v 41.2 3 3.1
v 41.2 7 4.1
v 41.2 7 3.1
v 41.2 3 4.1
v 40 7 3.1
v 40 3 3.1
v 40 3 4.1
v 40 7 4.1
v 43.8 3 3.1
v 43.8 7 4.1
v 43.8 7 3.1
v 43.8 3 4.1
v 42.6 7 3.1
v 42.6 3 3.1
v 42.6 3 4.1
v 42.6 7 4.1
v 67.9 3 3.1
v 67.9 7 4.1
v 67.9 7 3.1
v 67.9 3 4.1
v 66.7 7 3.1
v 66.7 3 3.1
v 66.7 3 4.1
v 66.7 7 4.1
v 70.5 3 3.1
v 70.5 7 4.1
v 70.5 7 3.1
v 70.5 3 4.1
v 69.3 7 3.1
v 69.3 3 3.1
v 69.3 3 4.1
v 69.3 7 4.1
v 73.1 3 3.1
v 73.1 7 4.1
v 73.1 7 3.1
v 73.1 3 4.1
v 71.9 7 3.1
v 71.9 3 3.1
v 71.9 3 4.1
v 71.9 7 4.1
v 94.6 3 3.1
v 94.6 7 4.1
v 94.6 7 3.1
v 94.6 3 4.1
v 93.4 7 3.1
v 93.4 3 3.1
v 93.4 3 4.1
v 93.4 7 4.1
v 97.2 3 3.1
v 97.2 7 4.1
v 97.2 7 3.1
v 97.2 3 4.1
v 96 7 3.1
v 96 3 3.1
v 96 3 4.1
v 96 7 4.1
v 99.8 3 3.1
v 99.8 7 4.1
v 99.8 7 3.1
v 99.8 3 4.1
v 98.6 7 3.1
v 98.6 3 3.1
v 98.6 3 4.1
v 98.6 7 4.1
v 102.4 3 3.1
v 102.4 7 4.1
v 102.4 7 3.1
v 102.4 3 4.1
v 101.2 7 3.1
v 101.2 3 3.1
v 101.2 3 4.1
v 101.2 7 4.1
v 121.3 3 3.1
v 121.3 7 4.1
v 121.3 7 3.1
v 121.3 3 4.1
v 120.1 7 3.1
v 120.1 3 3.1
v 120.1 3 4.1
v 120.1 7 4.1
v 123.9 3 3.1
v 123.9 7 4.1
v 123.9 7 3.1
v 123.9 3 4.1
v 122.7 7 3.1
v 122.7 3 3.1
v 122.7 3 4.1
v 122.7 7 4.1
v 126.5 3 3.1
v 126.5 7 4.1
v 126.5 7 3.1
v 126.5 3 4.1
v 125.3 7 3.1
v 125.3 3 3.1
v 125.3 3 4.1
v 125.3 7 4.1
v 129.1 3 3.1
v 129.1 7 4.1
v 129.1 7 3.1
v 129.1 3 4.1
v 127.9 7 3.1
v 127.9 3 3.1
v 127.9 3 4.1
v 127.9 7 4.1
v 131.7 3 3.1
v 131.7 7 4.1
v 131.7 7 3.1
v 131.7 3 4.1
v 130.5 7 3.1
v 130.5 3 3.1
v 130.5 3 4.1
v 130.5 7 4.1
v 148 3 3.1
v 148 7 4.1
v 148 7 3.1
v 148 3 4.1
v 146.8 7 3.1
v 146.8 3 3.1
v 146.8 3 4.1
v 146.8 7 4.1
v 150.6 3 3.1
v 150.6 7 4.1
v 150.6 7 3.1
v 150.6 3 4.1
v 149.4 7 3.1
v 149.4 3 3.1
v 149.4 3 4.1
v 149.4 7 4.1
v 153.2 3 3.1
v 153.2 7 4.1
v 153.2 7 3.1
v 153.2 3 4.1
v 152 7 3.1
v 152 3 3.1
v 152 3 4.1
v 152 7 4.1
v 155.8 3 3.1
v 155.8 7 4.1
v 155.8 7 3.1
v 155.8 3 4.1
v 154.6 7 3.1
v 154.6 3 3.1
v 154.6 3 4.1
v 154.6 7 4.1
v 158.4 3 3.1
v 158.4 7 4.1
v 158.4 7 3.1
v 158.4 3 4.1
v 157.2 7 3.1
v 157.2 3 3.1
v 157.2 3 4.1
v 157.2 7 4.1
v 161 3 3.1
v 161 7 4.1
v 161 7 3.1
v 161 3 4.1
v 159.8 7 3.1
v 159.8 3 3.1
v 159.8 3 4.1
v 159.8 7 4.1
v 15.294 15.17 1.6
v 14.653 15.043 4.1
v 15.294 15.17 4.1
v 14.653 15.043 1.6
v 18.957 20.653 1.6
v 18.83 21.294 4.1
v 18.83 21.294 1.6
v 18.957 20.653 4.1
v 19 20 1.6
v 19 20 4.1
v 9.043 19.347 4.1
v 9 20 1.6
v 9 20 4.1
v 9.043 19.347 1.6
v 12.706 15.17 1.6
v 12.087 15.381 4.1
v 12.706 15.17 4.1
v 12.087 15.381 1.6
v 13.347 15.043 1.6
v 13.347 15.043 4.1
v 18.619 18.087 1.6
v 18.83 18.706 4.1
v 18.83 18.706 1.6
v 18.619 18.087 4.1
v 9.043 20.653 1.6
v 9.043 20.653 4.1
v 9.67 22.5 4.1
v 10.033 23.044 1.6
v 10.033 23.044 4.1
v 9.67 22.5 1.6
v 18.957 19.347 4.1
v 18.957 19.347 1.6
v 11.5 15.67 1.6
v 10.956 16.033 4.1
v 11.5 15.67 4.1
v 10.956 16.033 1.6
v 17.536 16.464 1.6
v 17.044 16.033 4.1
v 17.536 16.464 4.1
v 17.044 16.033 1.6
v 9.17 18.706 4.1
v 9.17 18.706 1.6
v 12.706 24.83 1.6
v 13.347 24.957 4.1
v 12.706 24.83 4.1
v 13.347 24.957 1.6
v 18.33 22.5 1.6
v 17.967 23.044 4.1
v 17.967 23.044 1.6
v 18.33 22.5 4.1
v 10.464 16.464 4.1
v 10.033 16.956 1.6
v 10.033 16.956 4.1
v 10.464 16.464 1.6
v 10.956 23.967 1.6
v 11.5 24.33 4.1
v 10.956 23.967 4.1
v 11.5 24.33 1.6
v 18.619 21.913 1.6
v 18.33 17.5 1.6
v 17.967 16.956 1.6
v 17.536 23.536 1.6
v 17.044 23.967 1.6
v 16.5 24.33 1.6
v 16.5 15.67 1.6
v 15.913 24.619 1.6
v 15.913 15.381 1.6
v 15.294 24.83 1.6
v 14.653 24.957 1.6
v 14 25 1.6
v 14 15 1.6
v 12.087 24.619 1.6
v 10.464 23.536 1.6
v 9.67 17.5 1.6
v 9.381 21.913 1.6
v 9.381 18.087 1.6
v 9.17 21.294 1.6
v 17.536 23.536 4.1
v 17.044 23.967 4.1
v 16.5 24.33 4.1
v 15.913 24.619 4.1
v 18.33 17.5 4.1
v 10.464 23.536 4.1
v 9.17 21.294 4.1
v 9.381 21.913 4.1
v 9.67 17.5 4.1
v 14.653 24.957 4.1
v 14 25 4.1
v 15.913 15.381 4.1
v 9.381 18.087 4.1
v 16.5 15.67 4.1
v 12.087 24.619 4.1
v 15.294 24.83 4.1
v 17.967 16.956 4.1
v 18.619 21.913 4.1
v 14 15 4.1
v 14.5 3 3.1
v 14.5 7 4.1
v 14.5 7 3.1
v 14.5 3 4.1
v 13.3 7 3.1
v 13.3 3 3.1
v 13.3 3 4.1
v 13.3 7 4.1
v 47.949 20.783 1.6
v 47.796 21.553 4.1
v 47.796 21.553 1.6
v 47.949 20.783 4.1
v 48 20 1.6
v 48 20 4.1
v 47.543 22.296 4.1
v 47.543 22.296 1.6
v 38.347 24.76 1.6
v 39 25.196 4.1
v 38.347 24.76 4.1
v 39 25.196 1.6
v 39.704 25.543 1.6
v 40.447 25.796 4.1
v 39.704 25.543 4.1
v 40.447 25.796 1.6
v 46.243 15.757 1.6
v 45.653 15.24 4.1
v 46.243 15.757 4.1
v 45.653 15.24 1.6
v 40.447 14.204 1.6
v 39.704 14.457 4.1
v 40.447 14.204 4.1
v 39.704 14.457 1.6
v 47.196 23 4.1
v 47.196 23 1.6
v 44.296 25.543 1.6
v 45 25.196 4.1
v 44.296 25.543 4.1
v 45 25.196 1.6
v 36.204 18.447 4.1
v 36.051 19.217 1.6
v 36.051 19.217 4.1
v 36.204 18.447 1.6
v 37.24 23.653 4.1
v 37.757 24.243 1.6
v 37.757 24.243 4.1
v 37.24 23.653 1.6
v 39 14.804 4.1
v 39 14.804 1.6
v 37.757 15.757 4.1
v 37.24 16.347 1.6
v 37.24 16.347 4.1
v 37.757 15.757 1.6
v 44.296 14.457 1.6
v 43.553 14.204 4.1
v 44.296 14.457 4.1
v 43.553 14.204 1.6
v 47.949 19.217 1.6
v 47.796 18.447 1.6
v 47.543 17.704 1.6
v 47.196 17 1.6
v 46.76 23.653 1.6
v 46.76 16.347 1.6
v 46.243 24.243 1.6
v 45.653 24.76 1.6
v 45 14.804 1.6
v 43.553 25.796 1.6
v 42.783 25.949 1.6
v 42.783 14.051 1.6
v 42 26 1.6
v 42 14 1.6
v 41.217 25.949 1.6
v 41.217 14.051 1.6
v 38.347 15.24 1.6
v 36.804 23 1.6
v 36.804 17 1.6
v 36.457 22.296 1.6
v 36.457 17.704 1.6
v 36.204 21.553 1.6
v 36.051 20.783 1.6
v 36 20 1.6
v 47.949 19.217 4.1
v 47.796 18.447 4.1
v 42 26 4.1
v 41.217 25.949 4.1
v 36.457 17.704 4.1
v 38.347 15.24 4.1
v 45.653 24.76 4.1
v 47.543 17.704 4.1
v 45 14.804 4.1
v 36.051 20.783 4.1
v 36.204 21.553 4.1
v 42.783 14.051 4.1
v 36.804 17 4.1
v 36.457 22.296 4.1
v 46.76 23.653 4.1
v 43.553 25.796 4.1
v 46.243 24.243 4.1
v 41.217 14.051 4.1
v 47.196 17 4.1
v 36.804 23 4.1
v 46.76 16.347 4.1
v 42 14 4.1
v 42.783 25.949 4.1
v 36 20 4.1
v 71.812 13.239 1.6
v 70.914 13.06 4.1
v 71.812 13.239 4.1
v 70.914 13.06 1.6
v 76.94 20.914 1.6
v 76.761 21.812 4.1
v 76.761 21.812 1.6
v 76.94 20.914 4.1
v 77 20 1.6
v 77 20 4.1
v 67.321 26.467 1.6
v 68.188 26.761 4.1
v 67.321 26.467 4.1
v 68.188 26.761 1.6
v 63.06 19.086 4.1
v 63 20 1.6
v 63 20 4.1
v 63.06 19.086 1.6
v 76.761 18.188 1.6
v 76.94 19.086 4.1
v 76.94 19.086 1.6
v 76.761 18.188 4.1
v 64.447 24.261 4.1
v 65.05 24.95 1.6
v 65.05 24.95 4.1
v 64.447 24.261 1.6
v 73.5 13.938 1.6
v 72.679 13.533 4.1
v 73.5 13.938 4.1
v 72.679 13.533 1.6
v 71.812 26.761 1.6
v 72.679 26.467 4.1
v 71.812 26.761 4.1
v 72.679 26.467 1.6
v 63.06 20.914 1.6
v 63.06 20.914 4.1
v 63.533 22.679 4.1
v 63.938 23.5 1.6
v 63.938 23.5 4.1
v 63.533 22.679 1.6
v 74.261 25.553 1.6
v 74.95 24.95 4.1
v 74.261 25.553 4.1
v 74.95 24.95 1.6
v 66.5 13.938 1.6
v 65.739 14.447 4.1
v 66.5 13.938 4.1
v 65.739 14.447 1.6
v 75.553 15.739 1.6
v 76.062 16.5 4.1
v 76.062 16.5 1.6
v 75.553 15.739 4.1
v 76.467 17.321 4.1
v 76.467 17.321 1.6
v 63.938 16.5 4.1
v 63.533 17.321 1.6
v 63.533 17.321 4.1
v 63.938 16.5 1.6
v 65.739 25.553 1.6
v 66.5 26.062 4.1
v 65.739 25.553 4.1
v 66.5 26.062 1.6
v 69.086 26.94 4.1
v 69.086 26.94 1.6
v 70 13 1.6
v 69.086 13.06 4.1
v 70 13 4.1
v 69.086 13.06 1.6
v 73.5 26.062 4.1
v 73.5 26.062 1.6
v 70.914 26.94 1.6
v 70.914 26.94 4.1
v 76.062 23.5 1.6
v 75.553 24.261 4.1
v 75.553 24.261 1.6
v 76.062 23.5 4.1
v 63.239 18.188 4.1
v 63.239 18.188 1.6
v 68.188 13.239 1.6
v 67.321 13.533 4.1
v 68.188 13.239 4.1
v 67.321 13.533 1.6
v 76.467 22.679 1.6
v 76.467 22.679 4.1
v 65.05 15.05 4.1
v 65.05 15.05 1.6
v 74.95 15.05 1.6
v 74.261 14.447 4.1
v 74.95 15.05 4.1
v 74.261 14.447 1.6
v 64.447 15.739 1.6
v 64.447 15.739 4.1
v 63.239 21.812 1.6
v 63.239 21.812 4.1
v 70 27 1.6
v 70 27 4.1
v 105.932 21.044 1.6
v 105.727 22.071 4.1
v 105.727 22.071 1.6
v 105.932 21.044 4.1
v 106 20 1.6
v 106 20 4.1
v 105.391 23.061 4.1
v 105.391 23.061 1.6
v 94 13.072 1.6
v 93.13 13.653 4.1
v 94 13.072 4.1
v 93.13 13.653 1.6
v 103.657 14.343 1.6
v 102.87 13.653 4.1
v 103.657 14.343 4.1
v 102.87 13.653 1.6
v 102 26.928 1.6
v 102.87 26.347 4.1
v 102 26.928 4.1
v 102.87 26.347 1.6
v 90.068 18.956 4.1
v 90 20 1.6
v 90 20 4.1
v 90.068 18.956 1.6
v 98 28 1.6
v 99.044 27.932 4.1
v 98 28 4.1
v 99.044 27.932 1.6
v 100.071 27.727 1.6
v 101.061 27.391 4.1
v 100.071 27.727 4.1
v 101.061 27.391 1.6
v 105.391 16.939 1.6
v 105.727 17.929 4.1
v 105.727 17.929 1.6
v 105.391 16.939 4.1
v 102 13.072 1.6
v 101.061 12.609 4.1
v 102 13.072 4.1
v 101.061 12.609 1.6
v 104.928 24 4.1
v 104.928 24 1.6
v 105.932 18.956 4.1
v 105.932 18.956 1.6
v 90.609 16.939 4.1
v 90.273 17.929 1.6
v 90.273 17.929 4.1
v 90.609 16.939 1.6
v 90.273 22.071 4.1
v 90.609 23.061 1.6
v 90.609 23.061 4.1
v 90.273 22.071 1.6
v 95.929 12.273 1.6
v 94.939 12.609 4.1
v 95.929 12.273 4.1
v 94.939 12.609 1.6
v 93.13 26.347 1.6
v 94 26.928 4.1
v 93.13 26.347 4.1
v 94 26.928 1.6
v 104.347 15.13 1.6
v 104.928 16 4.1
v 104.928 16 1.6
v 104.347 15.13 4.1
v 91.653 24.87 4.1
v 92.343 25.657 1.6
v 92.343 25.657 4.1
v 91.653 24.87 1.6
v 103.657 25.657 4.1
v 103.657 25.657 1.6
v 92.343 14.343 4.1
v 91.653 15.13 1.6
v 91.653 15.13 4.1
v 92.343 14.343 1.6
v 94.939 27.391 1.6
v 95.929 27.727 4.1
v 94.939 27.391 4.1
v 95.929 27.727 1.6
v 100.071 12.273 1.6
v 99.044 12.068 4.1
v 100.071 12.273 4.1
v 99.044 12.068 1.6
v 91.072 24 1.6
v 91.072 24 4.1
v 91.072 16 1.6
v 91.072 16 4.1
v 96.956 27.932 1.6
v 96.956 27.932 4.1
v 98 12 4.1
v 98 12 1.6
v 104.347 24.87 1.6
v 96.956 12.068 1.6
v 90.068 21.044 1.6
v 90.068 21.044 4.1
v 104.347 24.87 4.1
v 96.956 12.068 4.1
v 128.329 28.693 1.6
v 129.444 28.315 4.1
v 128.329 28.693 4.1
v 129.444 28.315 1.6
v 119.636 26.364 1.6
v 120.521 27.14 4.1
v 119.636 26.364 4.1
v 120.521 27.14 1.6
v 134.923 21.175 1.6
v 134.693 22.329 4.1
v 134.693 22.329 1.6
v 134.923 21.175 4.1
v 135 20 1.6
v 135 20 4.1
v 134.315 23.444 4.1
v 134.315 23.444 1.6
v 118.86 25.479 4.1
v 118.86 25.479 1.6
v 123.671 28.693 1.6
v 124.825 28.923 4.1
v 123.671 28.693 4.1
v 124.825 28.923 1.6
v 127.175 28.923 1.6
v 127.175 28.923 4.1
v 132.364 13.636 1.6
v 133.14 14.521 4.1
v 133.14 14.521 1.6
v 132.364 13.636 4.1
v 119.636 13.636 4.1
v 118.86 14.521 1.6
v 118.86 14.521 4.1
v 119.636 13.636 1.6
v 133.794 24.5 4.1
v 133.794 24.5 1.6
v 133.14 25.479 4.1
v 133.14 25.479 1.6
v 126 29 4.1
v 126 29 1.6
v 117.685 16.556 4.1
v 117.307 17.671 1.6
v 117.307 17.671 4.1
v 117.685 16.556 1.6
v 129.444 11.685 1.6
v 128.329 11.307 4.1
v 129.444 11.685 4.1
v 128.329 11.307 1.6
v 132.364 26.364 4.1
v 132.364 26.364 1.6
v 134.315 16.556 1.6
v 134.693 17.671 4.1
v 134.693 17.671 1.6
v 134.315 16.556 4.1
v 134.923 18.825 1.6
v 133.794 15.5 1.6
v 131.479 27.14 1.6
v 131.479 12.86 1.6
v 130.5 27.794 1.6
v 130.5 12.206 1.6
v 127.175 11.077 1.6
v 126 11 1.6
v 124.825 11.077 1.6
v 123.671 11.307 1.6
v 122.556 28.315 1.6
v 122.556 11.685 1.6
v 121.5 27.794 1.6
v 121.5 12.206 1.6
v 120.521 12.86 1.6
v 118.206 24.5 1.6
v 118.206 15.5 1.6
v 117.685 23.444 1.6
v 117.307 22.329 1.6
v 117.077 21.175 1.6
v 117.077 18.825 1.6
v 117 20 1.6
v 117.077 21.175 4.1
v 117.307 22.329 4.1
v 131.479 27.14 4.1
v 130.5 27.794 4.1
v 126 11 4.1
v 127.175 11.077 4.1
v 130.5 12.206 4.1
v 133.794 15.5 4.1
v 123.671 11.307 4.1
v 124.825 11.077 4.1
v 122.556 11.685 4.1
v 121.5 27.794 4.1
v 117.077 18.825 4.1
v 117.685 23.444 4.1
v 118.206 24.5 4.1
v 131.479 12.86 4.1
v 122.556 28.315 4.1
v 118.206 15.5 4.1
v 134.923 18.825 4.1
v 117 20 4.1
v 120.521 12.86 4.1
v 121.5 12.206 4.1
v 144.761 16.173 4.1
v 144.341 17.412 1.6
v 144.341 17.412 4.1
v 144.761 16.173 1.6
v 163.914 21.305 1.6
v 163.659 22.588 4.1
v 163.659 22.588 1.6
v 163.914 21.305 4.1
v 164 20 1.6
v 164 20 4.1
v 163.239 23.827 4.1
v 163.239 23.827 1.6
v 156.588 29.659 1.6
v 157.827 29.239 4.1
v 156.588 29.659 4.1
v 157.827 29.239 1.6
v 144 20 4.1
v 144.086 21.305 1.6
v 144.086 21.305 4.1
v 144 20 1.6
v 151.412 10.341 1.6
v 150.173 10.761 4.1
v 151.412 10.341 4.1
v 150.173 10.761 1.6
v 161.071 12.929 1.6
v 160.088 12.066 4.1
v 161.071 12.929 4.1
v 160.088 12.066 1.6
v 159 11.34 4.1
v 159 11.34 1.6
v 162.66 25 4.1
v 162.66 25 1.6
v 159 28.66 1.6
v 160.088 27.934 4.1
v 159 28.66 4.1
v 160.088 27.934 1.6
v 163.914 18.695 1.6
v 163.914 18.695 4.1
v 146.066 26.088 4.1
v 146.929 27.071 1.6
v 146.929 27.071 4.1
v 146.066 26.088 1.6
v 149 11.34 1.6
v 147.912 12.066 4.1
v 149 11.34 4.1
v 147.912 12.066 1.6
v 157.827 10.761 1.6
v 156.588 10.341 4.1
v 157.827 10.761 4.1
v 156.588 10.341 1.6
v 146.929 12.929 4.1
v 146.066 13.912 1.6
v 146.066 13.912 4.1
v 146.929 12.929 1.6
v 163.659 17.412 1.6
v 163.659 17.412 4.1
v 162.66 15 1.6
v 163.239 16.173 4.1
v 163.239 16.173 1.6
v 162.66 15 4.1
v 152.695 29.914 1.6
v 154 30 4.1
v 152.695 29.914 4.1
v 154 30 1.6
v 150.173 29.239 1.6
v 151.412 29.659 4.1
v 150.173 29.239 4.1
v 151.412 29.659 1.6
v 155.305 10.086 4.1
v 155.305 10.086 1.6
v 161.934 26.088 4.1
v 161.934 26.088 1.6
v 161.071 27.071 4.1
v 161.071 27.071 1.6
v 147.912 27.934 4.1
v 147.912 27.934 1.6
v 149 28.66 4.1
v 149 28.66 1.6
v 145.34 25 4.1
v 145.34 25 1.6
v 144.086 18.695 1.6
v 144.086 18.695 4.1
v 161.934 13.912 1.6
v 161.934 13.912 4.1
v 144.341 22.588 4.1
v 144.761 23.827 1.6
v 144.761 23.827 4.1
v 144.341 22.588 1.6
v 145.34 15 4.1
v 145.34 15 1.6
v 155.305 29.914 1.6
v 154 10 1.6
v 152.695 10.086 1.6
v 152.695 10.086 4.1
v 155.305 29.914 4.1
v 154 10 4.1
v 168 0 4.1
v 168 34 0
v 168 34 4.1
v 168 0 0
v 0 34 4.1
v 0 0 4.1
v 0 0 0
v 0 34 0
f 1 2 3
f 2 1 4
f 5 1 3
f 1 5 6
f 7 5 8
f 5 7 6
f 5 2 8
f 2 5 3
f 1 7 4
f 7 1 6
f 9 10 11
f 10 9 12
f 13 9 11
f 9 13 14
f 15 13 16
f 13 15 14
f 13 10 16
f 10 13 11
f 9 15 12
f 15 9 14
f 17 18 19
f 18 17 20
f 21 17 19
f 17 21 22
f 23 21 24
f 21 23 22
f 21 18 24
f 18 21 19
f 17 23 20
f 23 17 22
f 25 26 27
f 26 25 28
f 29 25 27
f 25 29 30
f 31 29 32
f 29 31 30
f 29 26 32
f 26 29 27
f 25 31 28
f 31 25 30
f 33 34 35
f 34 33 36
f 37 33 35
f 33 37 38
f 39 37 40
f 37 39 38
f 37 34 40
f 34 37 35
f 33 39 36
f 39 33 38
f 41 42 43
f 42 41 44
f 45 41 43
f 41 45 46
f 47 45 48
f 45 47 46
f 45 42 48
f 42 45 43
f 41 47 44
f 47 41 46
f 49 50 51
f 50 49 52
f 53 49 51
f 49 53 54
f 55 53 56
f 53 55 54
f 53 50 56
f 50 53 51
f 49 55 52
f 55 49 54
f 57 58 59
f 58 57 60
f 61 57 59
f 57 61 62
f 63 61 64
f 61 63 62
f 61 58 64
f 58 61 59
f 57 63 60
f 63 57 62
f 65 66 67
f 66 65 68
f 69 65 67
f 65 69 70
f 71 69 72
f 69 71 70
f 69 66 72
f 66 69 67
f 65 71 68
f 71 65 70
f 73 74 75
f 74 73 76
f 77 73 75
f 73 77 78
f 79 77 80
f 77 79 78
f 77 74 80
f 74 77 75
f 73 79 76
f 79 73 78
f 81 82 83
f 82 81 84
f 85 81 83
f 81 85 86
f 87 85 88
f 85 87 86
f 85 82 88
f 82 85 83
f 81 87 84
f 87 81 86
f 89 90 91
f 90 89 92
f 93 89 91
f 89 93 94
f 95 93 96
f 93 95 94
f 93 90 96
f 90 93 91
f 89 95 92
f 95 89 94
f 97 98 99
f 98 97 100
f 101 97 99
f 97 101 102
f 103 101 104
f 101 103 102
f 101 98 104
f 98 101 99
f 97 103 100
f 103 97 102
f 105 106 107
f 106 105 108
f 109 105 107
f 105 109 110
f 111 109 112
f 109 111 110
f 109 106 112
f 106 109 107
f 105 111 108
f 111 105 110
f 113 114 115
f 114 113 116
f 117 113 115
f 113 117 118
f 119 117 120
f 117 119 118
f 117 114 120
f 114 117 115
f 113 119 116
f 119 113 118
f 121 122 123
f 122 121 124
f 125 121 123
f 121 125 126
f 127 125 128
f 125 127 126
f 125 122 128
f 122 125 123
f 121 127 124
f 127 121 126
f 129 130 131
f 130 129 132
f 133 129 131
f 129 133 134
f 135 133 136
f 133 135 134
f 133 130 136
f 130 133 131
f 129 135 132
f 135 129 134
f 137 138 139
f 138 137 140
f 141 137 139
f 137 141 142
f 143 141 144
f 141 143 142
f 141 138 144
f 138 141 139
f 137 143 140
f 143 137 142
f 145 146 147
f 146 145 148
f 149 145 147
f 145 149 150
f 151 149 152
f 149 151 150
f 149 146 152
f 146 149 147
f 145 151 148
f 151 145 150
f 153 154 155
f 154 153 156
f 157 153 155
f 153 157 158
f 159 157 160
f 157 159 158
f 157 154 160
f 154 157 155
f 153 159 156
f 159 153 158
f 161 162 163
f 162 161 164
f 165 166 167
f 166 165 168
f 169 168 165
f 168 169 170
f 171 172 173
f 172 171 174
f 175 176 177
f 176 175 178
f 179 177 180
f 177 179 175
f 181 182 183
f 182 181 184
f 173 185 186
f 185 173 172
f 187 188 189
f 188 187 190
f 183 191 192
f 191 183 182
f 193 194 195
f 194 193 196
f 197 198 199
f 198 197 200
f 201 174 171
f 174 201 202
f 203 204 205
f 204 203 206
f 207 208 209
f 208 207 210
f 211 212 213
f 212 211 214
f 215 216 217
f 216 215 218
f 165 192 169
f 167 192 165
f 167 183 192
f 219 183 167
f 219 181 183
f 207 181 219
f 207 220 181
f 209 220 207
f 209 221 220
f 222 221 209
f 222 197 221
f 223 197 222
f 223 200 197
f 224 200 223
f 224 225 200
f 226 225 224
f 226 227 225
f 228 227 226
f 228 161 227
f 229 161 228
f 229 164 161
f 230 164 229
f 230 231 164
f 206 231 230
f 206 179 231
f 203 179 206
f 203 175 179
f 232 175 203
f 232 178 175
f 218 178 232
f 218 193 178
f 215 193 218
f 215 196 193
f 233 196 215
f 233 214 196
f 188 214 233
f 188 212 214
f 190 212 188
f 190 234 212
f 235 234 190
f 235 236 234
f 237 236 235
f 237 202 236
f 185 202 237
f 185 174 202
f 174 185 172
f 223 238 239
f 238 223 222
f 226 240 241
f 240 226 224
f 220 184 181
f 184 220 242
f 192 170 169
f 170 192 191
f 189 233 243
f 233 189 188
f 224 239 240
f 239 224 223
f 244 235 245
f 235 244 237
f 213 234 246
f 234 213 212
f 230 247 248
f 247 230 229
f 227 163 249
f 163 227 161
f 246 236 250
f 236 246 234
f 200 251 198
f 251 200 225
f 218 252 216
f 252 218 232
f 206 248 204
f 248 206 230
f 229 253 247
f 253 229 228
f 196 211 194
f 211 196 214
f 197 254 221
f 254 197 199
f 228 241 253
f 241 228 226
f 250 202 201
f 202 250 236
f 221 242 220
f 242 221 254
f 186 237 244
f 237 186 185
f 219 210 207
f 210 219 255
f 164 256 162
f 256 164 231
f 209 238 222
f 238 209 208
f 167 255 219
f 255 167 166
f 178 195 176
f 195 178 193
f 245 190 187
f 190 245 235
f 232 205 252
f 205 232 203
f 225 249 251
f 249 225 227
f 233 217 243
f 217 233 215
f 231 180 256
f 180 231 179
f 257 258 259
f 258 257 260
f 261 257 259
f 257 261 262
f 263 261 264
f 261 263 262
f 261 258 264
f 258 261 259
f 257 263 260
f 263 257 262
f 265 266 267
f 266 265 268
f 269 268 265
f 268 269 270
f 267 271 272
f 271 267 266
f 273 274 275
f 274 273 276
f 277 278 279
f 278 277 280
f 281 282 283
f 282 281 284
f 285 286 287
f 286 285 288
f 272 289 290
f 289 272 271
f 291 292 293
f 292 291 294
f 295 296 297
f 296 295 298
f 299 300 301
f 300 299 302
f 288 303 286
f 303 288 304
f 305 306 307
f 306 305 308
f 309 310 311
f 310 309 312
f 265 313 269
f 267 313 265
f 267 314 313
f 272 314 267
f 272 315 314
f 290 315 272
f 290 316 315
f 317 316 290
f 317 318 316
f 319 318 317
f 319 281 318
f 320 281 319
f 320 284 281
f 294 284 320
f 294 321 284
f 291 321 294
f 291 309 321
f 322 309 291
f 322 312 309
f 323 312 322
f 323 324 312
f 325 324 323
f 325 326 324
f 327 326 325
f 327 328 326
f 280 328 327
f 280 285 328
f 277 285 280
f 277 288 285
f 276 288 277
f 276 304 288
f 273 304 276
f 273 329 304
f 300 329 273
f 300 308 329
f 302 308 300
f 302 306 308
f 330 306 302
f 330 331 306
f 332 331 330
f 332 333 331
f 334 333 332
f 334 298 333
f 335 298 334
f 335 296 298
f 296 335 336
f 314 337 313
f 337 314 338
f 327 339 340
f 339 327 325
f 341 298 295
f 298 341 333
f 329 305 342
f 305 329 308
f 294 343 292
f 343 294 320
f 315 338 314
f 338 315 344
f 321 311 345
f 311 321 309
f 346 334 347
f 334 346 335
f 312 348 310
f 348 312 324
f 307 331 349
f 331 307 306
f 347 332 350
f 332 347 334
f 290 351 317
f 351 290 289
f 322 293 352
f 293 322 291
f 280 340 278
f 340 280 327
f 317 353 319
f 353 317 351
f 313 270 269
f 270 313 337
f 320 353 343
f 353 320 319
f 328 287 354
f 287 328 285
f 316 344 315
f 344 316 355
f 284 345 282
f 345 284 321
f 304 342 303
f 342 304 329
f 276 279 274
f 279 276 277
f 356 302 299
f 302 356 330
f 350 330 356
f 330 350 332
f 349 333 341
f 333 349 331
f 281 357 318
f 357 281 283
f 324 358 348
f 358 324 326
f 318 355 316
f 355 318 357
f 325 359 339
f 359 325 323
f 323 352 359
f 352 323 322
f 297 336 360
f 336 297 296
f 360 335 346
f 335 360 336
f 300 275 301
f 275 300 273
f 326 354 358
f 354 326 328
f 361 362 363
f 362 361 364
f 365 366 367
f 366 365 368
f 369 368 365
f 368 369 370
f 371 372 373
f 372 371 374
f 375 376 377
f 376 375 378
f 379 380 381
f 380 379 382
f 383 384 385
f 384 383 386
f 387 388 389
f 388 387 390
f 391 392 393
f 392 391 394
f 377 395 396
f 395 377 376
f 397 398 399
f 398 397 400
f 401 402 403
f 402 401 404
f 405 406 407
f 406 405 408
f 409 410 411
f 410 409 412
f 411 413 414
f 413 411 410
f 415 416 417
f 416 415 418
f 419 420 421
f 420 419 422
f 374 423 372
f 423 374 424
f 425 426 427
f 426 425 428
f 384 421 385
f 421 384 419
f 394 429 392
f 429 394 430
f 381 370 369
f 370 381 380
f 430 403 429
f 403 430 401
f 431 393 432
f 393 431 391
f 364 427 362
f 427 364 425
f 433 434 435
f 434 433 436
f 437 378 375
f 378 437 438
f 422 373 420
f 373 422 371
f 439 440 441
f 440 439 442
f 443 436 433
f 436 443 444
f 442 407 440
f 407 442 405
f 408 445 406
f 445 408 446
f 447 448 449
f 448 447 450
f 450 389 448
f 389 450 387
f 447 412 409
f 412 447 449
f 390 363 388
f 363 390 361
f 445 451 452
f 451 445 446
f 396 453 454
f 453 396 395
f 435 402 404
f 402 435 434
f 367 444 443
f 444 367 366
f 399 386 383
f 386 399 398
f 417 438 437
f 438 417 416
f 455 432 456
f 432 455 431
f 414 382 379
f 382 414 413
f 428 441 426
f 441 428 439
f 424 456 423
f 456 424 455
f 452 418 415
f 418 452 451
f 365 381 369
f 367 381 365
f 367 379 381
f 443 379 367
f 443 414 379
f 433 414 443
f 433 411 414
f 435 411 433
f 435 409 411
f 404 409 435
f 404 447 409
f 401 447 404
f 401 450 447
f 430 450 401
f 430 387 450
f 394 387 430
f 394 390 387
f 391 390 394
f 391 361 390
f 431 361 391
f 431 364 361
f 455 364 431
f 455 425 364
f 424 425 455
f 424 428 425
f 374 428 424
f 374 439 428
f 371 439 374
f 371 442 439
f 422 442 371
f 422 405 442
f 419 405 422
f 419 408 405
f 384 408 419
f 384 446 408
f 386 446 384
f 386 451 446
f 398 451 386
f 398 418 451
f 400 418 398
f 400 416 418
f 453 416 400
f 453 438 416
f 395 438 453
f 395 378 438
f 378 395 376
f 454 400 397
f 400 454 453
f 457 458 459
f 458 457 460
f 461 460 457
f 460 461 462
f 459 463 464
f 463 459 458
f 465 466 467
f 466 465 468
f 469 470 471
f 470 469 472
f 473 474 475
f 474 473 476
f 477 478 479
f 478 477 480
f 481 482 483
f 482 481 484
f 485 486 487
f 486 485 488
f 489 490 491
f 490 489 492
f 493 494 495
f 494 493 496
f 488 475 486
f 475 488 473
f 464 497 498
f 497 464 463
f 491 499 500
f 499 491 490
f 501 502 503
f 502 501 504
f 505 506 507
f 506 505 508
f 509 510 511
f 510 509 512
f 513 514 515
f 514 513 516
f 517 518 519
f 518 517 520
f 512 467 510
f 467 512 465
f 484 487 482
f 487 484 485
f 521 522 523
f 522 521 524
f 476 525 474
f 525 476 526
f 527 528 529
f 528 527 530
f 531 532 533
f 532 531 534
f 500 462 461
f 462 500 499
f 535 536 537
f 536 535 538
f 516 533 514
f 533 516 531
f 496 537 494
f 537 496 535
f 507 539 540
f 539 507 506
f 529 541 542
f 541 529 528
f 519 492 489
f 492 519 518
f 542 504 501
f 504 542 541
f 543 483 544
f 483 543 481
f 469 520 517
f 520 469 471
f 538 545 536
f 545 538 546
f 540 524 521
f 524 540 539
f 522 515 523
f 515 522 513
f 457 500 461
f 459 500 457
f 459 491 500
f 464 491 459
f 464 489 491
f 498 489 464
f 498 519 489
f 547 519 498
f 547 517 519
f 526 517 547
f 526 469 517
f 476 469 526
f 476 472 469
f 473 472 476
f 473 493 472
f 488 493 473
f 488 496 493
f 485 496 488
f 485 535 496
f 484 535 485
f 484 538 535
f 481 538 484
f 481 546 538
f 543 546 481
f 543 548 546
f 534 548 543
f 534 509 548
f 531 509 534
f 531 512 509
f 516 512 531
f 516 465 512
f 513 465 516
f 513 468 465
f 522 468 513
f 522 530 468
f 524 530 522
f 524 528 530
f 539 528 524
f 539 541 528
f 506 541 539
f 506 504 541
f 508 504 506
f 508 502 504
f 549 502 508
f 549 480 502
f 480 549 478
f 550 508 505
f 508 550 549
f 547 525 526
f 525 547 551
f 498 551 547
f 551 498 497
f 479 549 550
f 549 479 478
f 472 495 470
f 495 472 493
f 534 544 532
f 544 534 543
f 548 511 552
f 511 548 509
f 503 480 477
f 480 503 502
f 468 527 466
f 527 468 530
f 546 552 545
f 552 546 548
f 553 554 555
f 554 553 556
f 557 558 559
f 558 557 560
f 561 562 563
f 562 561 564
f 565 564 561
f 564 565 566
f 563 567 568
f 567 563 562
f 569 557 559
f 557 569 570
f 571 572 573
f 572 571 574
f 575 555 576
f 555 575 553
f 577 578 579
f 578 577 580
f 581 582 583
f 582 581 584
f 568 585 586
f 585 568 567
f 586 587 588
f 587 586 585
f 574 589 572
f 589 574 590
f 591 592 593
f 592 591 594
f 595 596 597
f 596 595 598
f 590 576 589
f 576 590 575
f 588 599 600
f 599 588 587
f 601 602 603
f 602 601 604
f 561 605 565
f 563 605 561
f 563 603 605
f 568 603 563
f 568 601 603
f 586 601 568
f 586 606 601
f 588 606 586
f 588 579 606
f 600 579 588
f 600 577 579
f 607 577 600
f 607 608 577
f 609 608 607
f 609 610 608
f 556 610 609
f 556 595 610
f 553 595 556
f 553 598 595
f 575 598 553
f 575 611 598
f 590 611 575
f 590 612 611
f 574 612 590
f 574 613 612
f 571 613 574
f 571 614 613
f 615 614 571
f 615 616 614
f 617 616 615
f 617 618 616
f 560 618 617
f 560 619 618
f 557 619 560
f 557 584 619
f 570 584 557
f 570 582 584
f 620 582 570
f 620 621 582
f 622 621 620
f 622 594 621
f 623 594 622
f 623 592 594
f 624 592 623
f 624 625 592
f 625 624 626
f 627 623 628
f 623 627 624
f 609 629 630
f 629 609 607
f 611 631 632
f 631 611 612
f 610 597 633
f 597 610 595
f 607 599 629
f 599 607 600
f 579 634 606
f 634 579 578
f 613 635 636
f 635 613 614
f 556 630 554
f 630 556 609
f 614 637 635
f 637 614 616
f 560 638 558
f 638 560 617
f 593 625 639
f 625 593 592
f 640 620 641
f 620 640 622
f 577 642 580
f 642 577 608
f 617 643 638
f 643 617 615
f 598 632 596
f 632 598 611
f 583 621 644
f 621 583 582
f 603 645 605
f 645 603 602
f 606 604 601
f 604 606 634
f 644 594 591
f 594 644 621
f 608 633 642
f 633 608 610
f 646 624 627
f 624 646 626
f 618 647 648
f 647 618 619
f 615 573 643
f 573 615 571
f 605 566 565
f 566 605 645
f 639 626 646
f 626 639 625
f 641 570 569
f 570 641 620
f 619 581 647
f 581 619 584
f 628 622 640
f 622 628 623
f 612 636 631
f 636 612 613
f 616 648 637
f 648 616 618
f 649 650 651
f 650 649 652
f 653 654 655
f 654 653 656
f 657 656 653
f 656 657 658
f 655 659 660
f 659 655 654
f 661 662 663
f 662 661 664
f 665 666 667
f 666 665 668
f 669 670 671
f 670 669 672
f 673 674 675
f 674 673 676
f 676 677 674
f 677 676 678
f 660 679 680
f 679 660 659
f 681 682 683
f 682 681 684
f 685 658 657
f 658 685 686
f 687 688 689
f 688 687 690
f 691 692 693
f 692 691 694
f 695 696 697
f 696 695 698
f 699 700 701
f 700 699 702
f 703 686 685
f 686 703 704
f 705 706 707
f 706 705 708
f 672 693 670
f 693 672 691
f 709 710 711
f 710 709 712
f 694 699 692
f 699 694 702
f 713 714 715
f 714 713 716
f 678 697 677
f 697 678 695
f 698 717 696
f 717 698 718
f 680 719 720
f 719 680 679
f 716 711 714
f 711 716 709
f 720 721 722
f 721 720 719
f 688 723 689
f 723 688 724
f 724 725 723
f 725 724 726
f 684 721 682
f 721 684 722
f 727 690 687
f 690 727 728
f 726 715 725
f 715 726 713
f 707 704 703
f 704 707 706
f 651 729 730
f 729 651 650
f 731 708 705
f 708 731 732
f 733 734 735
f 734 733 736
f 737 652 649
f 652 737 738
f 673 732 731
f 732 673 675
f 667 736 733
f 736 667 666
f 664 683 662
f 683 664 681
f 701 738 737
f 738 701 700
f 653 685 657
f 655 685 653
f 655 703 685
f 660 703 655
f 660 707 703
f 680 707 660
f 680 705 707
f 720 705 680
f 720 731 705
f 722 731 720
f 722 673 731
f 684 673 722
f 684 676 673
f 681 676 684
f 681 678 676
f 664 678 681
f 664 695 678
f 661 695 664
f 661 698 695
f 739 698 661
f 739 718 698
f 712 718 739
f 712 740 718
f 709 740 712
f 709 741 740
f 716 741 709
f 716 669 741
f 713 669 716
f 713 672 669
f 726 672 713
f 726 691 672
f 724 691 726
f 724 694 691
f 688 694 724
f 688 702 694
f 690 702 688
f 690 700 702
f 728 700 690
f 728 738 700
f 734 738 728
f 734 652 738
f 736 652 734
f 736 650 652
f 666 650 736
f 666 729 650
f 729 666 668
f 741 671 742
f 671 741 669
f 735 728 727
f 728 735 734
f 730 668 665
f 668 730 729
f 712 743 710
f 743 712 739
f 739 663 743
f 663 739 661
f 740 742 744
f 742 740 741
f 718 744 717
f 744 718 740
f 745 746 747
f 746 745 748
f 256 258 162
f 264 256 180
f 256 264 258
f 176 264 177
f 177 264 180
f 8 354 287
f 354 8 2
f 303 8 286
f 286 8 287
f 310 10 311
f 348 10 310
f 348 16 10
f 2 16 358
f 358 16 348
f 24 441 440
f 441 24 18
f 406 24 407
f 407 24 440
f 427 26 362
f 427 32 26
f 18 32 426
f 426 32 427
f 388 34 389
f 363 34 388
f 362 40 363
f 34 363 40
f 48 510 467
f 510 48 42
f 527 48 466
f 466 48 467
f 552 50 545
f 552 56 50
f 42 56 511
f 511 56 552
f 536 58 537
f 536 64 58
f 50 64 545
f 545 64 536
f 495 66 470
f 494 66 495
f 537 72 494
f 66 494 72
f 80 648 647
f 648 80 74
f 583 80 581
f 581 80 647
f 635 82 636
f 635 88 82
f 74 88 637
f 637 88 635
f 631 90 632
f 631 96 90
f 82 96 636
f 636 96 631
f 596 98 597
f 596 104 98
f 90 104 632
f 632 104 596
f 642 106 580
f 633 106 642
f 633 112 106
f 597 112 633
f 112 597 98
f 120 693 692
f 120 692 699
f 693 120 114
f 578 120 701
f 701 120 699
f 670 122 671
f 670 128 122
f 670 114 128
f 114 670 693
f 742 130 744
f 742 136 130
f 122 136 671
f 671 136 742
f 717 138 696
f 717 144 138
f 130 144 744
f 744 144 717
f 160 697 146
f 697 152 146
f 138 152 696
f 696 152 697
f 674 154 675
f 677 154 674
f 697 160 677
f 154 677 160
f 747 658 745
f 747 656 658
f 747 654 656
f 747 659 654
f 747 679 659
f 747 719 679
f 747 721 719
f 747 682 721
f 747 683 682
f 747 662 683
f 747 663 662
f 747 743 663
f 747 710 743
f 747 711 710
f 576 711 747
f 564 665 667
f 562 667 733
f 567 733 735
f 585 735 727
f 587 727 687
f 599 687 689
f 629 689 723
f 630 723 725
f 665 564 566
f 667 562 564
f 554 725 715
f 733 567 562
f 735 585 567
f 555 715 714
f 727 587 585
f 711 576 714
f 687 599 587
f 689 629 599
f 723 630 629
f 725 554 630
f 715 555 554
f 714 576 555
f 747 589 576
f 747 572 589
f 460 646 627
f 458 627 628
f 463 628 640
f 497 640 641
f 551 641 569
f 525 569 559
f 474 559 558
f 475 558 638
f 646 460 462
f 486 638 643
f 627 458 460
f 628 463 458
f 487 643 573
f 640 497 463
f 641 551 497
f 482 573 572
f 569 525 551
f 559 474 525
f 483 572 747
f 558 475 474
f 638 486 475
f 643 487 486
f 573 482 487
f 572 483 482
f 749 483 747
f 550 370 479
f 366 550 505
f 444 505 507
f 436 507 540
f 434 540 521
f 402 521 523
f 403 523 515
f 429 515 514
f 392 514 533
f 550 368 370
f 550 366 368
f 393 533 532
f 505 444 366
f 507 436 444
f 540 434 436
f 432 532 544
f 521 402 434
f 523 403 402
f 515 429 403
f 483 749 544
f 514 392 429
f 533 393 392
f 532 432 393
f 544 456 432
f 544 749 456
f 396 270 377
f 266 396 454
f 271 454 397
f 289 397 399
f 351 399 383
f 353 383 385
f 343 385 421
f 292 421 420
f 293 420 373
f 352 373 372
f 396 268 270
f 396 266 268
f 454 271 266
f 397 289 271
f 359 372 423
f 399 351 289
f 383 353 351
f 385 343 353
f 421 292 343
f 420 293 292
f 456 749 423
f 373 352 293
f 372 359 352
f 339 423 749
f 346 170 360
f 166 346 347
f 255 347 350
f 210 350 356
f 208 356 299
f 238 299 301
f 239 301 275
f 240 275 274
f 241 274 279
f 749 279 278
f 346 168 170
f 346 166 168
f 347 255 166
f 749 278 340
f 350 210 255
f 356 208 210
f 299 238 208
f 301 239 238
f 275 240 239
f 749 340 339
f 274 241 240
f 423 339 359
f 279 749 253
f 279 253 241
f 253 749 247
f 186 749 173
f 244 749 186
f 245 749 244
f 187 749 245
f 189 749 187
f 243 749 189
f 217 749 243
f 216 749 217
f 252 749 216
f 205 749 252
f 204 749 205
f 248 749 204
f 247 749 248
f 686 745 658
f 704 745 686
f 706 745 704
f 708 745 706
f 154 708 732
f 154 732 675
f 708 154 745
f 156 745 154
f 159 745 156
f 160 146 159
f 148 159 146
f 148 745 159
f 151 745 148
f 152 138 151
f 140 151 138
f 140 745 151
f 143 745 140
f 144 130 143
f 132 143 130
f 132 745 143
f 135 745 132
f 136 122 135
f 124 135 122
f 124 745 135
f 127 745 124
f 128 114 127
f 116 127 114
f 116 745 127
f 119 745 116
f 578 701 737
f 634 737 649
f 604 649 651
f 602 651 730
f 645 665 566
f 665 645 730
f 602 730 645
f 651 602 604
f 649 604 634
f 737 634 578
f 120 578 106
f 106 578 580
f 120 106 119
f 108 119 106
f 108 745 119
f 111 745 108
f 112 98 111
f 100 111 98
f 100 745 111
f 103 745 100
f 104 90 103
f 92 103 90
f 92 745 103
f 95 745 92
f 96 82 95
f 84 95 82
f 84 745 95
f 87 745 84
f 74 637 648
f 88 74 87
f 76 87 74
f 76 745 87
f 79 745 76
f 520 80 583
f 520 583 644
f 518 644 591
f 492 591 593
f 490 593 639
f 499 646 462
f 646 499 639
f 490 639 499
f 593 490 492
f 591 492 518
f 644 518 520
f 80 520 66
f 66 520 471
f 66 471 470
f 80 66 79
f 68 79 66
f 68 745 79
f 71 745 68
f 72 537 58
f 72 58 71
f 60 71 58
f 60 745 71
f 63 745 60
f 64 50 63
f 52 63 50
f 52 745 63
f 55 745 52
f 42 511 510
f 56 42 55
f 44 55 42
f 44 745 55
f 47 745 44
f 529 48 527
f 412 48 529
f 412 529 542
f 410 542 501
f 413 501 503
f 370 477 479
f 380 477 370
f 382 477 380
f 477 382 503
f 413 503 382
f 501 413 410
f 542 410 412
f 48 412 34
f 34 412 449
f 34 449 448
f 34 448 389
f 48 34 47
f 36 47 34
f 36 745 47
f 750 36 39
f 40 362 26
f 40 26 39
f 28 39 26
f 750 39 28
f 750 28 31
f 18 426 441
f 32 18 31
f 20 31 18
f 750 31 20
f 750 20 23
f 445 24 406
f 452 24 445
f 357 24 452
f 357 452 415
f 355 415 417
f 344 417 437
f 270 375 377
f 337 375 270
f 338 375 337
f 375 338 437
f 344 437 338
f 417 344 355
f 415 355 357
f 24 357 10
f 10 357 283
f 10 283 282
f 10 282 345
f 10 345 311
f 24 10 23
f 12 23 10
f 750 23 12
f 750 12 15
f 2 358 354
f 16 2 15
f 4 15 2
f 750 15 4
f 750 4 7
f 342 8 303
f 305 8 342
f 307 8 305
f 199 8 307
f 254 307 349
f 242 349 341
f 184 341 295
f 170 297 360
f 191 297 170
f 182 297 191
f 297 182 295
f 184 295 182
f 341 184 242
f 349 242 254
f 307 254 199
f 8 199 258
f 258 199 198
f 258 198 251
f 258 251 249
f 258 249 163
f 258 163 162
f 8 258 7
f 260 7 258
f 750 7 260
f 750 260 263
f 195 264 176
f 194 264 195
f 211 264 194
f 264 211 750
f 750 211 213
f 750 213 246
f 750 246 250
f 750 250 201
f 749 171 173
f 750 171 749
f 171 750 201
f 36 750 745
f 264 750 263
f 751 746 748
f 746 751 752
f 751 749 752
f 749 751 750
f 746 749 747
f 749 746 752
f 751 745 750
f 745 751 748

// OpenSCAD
// file: riser_common.scad
// riser_common.scad — shared dimensions for the bench instrument risers.
//
// ONE part, printed as many times as you need, at two heights. A pedestal that
// stands on Gridfinity feet, so it LATCHES into a Clickfinity desk plate instead
// of skating. Put one under each instrument foot and the instrument's own
// footprint becomes open grid underneath.
//
//   hot air station  4 pedestals @ 6"
//   oscilloscope     2 pedestals @ 2"
//
// WHY THE TOP IS FLAT BY DEFAULT
//   A locating pocket has to be cut where that instrument's foot actually lands,
//   which makes the part bespoke — and the value here is that every pedestal is
//   interchangeable. The pedestal is latched to the plate and cannot move; the
//   instrument sits on it on its own rubber feet, which grip PETG fine. Set
//   POCKET_D above 0 only if something actually creeps in use, and accept that
//   those pedestals stop being interchangeable when you do.
//
// WHY IT IS MODELLED SOLID
//   No cavity, no walls, no open front — the slicer's infill decides how much
//   material this uses, which is the right place for that decision. A hollow
//   shell would need an opening to be useful, and an opening on a load-bearing
//   pedestal puts a weak axis under an instrument. Storage goes in the open grid
//   BETWEEN the pedestals, which is the point of raising anything.
//
// PRINT ORIENTATION: as emitted — feet DOWN, flat top up. Nothing to bridge, no
// supports, and the top face comes out flat as the last thing printed.

include <../lib/gridfinity.scad>

// Standardised across this repo after the OpenSCAD 2026.06.12 tessellation
// gotcha (scattered height/$fn combinations emit non-manifold edges). Do not
// raise this without re-rendering and checking the validator.
$fn = 48;

/* [Footprint] */
GX = 2;   // [1:1:4] cells across
GY = 2;   // [1:1:4] cells deep

/* [Heights] */
// Nominal, from the bench layout — both are "about", not measured constraints,
// so tune them freely. The pedestal height IS the clear height under the
// instrument, measured from the same datum a bin sits on (the desk plate's
// socket floor), so it compares directly against a bin's total height.
//
// Clickfinity's latch GRIPS: a bin comes out by pulling straight up against four
// arms per cell. Budget the bin height PLUS release travel PLUS room to get a
// hand in — sizing to bin height alone builds a shelf whose bins you cannot
// extract. Rule of thumb: usable bin height is roughly RISER_H minus 40.
SCOPE_RISE  =  50.8;  // 2" — fits shallow trays underneath (~10 mm bins)
HOTAIR_RISE = 152.4;  // 6" — takes the tallest bins in the repo with room over

// Either height can be overridden without editing this file:
//   openscad -o r.stl --export-format binstl -D RISER_H=90 riser_pedestal_scope.scad

/* [Foot pocket — OPTIONAL] */
POCKET_D = 0.00;   // finished pocket diameter. 0 = flat top (default).
                   //   If you do want pockets, get this from riser_foot_gauge —
                   //   NOT from calipers on the foot. The number that matters is
                   //   the finished hole a foot drops into, which folds the
                   //   foot's size, its rubber compliance, and this printer's
                   //   hole shrinkage into one reading.
POCKET_H = 2.50;   // [1:0.5:6] pocket depth. Shallow on purpose — it only has to
                   //   stop creep. Deep pockets on rubber feet make the
                   //   instrument awkward to lift off and add nothing.

/* [Stability] */
// Height-to-width ratio past which a pedestal is tippy while you are placing the
// instrument on it. The Gridfinity foot in a socket resists sideways load well,
// so this is about handling, not about the assembly falling over in use — once
// the instrument is on, its own chassis ties the pedestals together.
MAX_ASPECT = 1.60;  // [1:0.1:2.5]

// ---------------------------------------------------------------------------
// Geometry
// ---------------------------------------------------------------------------

module riser_pedestal(h, gx = GX, gy = GY, pocket_d = POCKET_D, pocket_h = POCKET_H) {
    narrow = min(gx, gy) * GF;

    assert(h > BIN_BASE_H + 2,
           "Riser height barely clears the Gridfinity foot — there is no pedestal left above it.");

    assert(h <= 270 && gx * GF <= 270 && gy * GF <= 270,
           "Pedestal exceeds the U1's 270 mm build volume.");

    assert(pocket_d == 0 || pocket_h < h - BIN_BASE_H,
           "Foot pocket is deeper than the solid material above the feet.");

    assert(pocket_d == 0 || pocket_d + 4 <= narrow - 0.5,
           "Foot pocket is wider than the pedestal it is cut into.");

    // Deliberately an echo and not an assert: a tall-and-narrow pedestal is a
    // handling nuisance, not a broken part, and the call on whether to widen it
    // depends on foot spacing this file does not know.
    if (h > MAX_ASPECT * narrow)
        echo(str("WARNING: pedestal is ", h / narrow,
                 ":1 tall vs wide (limit ", MAX_ASPECT,
                 "). Widen GX/GY if the instrument's foot spacing allows it."));

    difference() {
        bin_blank(gx, gy, h);

        if (pocket_d > 0)
            translate([0, 0, h - pocket_h])
                cylinder(h = pocket_h + 0.01, d = pocket_d);
    }
}
// main file
// riser_foot_gauge.scad — foot-pocket gauge for the scope riser. PRINT THIS FIRST.
//
// A strip of six BLIND pockets, 10 mm to 20 mm, each at the riser's real pocket
// depth. Prints in minutes and settles the one number the top plate depends on.
//
// WHY A GAUGE AND NOT CALIPERS
//   The useful number is not the foot's diameter — it is the finished pocket a
//   foot actually drops into, which folds the foot's own size, its rubber
//   compliance, and this printer's hole shrinkage into a single reading.
//   Calipers give you one of those three. This is the same reasoning that set
//   the OWON barrel-tip bore, where calipers and the gauge disagreed and the
//   gauge was right.
//
// WHY THE POCKETS ARE BLIND
//   The OWON tip gauge used through-holes, and a tip "falling through the 13"
//   read as too loose when the real bores were blind and held it fine. A blind
//   pocket is what the riser actually has, so that is what this tests.
//
// HOW TO USE
//   1. Print flat, as modelled. No supports. SAME filament and profile as the
//      real blocks — shrinkage is exactly what you are measuring.
//   2. Count the notches beside each pocket: 1 = 10 mm, then +2 mm per notch.
//   3. Tip the scope up and try its foot in each pocket, smallest first.
//   4. Keep the SMALLEST pocket the foot seats into without being forced. The
//      pocket only has to stop the scope creeping — it is not a clamp, and a
//      foot you have to push in is a scope you have to fight to lift off.
//   5. Tell me the notch count and I will set FOOT_D.
//
//   While the scope is tipped up, this is also the moment to get FOOT_SPAN_X and
//   FOOT_SPAN_Y — centre to centre, both directions. Those two plus this reading
//   are the entire input to the blocks.
//
// If the foot is bigger than the 20 mm pocket, or is a long rubber strip rather
// than a round foot, stop and tell me — a strip foot wants a slot, not a bore,
// and that is a different top plate.

include <riser_common.scad>

/* [Gauge] */
DIAMS   = [10, 12, 14, 16, 18, 20];  // pocket diameters, smallest first
BASE_T  = 1.60;   // [1:0.2:3] mm solid material under each blind pocket
PITCH   = 28.0;   // [24:1:40] mm spacing along the strip
GAUGE_W = 34.0;   // [26:1:50] mm strip width
NOTCH   = 1.20;   // [0.8:0.1:2] mm notch width
NOTCH_P = 2.60;   // [2:0.1:4] mm notch spacing
NOTCH_D = 1.00;   // [0.6:0.1:2] mm notch depth

// Pockets sit toward the back of the strip; the front band carries the tally.
_pocket_y = GAUGE_W - 14.0;
_len      = len(DIAMS) * PITCH;
_h        = BASE_T + POCKET_H;

difference() {
    cube([_len, GAUGE_W, _h]);

    for (i = [0 : len(DIAMS) - 1]) {
        cx = i * PITCH + PITCH / 2;

        // the blind pocket itself — depth matches the real top plate
        translate([cx, _pocket_y, BASE_T])
            cylinder(h = POCKET_H + 0.01, d = DIAMS[i]);

        // tally notches: i+1 of them, cut into the front band
        for (n = [0 : i])
            translate([cx - ((i + 1) * NOTCH_P - NOTCH) / 2 + n * NOTCH_P,
                       3.0,
                       _h - NOTCH_D])
                cube([NOTCH, 4.0, NOTCH_D + 0.01]);
    }
}
